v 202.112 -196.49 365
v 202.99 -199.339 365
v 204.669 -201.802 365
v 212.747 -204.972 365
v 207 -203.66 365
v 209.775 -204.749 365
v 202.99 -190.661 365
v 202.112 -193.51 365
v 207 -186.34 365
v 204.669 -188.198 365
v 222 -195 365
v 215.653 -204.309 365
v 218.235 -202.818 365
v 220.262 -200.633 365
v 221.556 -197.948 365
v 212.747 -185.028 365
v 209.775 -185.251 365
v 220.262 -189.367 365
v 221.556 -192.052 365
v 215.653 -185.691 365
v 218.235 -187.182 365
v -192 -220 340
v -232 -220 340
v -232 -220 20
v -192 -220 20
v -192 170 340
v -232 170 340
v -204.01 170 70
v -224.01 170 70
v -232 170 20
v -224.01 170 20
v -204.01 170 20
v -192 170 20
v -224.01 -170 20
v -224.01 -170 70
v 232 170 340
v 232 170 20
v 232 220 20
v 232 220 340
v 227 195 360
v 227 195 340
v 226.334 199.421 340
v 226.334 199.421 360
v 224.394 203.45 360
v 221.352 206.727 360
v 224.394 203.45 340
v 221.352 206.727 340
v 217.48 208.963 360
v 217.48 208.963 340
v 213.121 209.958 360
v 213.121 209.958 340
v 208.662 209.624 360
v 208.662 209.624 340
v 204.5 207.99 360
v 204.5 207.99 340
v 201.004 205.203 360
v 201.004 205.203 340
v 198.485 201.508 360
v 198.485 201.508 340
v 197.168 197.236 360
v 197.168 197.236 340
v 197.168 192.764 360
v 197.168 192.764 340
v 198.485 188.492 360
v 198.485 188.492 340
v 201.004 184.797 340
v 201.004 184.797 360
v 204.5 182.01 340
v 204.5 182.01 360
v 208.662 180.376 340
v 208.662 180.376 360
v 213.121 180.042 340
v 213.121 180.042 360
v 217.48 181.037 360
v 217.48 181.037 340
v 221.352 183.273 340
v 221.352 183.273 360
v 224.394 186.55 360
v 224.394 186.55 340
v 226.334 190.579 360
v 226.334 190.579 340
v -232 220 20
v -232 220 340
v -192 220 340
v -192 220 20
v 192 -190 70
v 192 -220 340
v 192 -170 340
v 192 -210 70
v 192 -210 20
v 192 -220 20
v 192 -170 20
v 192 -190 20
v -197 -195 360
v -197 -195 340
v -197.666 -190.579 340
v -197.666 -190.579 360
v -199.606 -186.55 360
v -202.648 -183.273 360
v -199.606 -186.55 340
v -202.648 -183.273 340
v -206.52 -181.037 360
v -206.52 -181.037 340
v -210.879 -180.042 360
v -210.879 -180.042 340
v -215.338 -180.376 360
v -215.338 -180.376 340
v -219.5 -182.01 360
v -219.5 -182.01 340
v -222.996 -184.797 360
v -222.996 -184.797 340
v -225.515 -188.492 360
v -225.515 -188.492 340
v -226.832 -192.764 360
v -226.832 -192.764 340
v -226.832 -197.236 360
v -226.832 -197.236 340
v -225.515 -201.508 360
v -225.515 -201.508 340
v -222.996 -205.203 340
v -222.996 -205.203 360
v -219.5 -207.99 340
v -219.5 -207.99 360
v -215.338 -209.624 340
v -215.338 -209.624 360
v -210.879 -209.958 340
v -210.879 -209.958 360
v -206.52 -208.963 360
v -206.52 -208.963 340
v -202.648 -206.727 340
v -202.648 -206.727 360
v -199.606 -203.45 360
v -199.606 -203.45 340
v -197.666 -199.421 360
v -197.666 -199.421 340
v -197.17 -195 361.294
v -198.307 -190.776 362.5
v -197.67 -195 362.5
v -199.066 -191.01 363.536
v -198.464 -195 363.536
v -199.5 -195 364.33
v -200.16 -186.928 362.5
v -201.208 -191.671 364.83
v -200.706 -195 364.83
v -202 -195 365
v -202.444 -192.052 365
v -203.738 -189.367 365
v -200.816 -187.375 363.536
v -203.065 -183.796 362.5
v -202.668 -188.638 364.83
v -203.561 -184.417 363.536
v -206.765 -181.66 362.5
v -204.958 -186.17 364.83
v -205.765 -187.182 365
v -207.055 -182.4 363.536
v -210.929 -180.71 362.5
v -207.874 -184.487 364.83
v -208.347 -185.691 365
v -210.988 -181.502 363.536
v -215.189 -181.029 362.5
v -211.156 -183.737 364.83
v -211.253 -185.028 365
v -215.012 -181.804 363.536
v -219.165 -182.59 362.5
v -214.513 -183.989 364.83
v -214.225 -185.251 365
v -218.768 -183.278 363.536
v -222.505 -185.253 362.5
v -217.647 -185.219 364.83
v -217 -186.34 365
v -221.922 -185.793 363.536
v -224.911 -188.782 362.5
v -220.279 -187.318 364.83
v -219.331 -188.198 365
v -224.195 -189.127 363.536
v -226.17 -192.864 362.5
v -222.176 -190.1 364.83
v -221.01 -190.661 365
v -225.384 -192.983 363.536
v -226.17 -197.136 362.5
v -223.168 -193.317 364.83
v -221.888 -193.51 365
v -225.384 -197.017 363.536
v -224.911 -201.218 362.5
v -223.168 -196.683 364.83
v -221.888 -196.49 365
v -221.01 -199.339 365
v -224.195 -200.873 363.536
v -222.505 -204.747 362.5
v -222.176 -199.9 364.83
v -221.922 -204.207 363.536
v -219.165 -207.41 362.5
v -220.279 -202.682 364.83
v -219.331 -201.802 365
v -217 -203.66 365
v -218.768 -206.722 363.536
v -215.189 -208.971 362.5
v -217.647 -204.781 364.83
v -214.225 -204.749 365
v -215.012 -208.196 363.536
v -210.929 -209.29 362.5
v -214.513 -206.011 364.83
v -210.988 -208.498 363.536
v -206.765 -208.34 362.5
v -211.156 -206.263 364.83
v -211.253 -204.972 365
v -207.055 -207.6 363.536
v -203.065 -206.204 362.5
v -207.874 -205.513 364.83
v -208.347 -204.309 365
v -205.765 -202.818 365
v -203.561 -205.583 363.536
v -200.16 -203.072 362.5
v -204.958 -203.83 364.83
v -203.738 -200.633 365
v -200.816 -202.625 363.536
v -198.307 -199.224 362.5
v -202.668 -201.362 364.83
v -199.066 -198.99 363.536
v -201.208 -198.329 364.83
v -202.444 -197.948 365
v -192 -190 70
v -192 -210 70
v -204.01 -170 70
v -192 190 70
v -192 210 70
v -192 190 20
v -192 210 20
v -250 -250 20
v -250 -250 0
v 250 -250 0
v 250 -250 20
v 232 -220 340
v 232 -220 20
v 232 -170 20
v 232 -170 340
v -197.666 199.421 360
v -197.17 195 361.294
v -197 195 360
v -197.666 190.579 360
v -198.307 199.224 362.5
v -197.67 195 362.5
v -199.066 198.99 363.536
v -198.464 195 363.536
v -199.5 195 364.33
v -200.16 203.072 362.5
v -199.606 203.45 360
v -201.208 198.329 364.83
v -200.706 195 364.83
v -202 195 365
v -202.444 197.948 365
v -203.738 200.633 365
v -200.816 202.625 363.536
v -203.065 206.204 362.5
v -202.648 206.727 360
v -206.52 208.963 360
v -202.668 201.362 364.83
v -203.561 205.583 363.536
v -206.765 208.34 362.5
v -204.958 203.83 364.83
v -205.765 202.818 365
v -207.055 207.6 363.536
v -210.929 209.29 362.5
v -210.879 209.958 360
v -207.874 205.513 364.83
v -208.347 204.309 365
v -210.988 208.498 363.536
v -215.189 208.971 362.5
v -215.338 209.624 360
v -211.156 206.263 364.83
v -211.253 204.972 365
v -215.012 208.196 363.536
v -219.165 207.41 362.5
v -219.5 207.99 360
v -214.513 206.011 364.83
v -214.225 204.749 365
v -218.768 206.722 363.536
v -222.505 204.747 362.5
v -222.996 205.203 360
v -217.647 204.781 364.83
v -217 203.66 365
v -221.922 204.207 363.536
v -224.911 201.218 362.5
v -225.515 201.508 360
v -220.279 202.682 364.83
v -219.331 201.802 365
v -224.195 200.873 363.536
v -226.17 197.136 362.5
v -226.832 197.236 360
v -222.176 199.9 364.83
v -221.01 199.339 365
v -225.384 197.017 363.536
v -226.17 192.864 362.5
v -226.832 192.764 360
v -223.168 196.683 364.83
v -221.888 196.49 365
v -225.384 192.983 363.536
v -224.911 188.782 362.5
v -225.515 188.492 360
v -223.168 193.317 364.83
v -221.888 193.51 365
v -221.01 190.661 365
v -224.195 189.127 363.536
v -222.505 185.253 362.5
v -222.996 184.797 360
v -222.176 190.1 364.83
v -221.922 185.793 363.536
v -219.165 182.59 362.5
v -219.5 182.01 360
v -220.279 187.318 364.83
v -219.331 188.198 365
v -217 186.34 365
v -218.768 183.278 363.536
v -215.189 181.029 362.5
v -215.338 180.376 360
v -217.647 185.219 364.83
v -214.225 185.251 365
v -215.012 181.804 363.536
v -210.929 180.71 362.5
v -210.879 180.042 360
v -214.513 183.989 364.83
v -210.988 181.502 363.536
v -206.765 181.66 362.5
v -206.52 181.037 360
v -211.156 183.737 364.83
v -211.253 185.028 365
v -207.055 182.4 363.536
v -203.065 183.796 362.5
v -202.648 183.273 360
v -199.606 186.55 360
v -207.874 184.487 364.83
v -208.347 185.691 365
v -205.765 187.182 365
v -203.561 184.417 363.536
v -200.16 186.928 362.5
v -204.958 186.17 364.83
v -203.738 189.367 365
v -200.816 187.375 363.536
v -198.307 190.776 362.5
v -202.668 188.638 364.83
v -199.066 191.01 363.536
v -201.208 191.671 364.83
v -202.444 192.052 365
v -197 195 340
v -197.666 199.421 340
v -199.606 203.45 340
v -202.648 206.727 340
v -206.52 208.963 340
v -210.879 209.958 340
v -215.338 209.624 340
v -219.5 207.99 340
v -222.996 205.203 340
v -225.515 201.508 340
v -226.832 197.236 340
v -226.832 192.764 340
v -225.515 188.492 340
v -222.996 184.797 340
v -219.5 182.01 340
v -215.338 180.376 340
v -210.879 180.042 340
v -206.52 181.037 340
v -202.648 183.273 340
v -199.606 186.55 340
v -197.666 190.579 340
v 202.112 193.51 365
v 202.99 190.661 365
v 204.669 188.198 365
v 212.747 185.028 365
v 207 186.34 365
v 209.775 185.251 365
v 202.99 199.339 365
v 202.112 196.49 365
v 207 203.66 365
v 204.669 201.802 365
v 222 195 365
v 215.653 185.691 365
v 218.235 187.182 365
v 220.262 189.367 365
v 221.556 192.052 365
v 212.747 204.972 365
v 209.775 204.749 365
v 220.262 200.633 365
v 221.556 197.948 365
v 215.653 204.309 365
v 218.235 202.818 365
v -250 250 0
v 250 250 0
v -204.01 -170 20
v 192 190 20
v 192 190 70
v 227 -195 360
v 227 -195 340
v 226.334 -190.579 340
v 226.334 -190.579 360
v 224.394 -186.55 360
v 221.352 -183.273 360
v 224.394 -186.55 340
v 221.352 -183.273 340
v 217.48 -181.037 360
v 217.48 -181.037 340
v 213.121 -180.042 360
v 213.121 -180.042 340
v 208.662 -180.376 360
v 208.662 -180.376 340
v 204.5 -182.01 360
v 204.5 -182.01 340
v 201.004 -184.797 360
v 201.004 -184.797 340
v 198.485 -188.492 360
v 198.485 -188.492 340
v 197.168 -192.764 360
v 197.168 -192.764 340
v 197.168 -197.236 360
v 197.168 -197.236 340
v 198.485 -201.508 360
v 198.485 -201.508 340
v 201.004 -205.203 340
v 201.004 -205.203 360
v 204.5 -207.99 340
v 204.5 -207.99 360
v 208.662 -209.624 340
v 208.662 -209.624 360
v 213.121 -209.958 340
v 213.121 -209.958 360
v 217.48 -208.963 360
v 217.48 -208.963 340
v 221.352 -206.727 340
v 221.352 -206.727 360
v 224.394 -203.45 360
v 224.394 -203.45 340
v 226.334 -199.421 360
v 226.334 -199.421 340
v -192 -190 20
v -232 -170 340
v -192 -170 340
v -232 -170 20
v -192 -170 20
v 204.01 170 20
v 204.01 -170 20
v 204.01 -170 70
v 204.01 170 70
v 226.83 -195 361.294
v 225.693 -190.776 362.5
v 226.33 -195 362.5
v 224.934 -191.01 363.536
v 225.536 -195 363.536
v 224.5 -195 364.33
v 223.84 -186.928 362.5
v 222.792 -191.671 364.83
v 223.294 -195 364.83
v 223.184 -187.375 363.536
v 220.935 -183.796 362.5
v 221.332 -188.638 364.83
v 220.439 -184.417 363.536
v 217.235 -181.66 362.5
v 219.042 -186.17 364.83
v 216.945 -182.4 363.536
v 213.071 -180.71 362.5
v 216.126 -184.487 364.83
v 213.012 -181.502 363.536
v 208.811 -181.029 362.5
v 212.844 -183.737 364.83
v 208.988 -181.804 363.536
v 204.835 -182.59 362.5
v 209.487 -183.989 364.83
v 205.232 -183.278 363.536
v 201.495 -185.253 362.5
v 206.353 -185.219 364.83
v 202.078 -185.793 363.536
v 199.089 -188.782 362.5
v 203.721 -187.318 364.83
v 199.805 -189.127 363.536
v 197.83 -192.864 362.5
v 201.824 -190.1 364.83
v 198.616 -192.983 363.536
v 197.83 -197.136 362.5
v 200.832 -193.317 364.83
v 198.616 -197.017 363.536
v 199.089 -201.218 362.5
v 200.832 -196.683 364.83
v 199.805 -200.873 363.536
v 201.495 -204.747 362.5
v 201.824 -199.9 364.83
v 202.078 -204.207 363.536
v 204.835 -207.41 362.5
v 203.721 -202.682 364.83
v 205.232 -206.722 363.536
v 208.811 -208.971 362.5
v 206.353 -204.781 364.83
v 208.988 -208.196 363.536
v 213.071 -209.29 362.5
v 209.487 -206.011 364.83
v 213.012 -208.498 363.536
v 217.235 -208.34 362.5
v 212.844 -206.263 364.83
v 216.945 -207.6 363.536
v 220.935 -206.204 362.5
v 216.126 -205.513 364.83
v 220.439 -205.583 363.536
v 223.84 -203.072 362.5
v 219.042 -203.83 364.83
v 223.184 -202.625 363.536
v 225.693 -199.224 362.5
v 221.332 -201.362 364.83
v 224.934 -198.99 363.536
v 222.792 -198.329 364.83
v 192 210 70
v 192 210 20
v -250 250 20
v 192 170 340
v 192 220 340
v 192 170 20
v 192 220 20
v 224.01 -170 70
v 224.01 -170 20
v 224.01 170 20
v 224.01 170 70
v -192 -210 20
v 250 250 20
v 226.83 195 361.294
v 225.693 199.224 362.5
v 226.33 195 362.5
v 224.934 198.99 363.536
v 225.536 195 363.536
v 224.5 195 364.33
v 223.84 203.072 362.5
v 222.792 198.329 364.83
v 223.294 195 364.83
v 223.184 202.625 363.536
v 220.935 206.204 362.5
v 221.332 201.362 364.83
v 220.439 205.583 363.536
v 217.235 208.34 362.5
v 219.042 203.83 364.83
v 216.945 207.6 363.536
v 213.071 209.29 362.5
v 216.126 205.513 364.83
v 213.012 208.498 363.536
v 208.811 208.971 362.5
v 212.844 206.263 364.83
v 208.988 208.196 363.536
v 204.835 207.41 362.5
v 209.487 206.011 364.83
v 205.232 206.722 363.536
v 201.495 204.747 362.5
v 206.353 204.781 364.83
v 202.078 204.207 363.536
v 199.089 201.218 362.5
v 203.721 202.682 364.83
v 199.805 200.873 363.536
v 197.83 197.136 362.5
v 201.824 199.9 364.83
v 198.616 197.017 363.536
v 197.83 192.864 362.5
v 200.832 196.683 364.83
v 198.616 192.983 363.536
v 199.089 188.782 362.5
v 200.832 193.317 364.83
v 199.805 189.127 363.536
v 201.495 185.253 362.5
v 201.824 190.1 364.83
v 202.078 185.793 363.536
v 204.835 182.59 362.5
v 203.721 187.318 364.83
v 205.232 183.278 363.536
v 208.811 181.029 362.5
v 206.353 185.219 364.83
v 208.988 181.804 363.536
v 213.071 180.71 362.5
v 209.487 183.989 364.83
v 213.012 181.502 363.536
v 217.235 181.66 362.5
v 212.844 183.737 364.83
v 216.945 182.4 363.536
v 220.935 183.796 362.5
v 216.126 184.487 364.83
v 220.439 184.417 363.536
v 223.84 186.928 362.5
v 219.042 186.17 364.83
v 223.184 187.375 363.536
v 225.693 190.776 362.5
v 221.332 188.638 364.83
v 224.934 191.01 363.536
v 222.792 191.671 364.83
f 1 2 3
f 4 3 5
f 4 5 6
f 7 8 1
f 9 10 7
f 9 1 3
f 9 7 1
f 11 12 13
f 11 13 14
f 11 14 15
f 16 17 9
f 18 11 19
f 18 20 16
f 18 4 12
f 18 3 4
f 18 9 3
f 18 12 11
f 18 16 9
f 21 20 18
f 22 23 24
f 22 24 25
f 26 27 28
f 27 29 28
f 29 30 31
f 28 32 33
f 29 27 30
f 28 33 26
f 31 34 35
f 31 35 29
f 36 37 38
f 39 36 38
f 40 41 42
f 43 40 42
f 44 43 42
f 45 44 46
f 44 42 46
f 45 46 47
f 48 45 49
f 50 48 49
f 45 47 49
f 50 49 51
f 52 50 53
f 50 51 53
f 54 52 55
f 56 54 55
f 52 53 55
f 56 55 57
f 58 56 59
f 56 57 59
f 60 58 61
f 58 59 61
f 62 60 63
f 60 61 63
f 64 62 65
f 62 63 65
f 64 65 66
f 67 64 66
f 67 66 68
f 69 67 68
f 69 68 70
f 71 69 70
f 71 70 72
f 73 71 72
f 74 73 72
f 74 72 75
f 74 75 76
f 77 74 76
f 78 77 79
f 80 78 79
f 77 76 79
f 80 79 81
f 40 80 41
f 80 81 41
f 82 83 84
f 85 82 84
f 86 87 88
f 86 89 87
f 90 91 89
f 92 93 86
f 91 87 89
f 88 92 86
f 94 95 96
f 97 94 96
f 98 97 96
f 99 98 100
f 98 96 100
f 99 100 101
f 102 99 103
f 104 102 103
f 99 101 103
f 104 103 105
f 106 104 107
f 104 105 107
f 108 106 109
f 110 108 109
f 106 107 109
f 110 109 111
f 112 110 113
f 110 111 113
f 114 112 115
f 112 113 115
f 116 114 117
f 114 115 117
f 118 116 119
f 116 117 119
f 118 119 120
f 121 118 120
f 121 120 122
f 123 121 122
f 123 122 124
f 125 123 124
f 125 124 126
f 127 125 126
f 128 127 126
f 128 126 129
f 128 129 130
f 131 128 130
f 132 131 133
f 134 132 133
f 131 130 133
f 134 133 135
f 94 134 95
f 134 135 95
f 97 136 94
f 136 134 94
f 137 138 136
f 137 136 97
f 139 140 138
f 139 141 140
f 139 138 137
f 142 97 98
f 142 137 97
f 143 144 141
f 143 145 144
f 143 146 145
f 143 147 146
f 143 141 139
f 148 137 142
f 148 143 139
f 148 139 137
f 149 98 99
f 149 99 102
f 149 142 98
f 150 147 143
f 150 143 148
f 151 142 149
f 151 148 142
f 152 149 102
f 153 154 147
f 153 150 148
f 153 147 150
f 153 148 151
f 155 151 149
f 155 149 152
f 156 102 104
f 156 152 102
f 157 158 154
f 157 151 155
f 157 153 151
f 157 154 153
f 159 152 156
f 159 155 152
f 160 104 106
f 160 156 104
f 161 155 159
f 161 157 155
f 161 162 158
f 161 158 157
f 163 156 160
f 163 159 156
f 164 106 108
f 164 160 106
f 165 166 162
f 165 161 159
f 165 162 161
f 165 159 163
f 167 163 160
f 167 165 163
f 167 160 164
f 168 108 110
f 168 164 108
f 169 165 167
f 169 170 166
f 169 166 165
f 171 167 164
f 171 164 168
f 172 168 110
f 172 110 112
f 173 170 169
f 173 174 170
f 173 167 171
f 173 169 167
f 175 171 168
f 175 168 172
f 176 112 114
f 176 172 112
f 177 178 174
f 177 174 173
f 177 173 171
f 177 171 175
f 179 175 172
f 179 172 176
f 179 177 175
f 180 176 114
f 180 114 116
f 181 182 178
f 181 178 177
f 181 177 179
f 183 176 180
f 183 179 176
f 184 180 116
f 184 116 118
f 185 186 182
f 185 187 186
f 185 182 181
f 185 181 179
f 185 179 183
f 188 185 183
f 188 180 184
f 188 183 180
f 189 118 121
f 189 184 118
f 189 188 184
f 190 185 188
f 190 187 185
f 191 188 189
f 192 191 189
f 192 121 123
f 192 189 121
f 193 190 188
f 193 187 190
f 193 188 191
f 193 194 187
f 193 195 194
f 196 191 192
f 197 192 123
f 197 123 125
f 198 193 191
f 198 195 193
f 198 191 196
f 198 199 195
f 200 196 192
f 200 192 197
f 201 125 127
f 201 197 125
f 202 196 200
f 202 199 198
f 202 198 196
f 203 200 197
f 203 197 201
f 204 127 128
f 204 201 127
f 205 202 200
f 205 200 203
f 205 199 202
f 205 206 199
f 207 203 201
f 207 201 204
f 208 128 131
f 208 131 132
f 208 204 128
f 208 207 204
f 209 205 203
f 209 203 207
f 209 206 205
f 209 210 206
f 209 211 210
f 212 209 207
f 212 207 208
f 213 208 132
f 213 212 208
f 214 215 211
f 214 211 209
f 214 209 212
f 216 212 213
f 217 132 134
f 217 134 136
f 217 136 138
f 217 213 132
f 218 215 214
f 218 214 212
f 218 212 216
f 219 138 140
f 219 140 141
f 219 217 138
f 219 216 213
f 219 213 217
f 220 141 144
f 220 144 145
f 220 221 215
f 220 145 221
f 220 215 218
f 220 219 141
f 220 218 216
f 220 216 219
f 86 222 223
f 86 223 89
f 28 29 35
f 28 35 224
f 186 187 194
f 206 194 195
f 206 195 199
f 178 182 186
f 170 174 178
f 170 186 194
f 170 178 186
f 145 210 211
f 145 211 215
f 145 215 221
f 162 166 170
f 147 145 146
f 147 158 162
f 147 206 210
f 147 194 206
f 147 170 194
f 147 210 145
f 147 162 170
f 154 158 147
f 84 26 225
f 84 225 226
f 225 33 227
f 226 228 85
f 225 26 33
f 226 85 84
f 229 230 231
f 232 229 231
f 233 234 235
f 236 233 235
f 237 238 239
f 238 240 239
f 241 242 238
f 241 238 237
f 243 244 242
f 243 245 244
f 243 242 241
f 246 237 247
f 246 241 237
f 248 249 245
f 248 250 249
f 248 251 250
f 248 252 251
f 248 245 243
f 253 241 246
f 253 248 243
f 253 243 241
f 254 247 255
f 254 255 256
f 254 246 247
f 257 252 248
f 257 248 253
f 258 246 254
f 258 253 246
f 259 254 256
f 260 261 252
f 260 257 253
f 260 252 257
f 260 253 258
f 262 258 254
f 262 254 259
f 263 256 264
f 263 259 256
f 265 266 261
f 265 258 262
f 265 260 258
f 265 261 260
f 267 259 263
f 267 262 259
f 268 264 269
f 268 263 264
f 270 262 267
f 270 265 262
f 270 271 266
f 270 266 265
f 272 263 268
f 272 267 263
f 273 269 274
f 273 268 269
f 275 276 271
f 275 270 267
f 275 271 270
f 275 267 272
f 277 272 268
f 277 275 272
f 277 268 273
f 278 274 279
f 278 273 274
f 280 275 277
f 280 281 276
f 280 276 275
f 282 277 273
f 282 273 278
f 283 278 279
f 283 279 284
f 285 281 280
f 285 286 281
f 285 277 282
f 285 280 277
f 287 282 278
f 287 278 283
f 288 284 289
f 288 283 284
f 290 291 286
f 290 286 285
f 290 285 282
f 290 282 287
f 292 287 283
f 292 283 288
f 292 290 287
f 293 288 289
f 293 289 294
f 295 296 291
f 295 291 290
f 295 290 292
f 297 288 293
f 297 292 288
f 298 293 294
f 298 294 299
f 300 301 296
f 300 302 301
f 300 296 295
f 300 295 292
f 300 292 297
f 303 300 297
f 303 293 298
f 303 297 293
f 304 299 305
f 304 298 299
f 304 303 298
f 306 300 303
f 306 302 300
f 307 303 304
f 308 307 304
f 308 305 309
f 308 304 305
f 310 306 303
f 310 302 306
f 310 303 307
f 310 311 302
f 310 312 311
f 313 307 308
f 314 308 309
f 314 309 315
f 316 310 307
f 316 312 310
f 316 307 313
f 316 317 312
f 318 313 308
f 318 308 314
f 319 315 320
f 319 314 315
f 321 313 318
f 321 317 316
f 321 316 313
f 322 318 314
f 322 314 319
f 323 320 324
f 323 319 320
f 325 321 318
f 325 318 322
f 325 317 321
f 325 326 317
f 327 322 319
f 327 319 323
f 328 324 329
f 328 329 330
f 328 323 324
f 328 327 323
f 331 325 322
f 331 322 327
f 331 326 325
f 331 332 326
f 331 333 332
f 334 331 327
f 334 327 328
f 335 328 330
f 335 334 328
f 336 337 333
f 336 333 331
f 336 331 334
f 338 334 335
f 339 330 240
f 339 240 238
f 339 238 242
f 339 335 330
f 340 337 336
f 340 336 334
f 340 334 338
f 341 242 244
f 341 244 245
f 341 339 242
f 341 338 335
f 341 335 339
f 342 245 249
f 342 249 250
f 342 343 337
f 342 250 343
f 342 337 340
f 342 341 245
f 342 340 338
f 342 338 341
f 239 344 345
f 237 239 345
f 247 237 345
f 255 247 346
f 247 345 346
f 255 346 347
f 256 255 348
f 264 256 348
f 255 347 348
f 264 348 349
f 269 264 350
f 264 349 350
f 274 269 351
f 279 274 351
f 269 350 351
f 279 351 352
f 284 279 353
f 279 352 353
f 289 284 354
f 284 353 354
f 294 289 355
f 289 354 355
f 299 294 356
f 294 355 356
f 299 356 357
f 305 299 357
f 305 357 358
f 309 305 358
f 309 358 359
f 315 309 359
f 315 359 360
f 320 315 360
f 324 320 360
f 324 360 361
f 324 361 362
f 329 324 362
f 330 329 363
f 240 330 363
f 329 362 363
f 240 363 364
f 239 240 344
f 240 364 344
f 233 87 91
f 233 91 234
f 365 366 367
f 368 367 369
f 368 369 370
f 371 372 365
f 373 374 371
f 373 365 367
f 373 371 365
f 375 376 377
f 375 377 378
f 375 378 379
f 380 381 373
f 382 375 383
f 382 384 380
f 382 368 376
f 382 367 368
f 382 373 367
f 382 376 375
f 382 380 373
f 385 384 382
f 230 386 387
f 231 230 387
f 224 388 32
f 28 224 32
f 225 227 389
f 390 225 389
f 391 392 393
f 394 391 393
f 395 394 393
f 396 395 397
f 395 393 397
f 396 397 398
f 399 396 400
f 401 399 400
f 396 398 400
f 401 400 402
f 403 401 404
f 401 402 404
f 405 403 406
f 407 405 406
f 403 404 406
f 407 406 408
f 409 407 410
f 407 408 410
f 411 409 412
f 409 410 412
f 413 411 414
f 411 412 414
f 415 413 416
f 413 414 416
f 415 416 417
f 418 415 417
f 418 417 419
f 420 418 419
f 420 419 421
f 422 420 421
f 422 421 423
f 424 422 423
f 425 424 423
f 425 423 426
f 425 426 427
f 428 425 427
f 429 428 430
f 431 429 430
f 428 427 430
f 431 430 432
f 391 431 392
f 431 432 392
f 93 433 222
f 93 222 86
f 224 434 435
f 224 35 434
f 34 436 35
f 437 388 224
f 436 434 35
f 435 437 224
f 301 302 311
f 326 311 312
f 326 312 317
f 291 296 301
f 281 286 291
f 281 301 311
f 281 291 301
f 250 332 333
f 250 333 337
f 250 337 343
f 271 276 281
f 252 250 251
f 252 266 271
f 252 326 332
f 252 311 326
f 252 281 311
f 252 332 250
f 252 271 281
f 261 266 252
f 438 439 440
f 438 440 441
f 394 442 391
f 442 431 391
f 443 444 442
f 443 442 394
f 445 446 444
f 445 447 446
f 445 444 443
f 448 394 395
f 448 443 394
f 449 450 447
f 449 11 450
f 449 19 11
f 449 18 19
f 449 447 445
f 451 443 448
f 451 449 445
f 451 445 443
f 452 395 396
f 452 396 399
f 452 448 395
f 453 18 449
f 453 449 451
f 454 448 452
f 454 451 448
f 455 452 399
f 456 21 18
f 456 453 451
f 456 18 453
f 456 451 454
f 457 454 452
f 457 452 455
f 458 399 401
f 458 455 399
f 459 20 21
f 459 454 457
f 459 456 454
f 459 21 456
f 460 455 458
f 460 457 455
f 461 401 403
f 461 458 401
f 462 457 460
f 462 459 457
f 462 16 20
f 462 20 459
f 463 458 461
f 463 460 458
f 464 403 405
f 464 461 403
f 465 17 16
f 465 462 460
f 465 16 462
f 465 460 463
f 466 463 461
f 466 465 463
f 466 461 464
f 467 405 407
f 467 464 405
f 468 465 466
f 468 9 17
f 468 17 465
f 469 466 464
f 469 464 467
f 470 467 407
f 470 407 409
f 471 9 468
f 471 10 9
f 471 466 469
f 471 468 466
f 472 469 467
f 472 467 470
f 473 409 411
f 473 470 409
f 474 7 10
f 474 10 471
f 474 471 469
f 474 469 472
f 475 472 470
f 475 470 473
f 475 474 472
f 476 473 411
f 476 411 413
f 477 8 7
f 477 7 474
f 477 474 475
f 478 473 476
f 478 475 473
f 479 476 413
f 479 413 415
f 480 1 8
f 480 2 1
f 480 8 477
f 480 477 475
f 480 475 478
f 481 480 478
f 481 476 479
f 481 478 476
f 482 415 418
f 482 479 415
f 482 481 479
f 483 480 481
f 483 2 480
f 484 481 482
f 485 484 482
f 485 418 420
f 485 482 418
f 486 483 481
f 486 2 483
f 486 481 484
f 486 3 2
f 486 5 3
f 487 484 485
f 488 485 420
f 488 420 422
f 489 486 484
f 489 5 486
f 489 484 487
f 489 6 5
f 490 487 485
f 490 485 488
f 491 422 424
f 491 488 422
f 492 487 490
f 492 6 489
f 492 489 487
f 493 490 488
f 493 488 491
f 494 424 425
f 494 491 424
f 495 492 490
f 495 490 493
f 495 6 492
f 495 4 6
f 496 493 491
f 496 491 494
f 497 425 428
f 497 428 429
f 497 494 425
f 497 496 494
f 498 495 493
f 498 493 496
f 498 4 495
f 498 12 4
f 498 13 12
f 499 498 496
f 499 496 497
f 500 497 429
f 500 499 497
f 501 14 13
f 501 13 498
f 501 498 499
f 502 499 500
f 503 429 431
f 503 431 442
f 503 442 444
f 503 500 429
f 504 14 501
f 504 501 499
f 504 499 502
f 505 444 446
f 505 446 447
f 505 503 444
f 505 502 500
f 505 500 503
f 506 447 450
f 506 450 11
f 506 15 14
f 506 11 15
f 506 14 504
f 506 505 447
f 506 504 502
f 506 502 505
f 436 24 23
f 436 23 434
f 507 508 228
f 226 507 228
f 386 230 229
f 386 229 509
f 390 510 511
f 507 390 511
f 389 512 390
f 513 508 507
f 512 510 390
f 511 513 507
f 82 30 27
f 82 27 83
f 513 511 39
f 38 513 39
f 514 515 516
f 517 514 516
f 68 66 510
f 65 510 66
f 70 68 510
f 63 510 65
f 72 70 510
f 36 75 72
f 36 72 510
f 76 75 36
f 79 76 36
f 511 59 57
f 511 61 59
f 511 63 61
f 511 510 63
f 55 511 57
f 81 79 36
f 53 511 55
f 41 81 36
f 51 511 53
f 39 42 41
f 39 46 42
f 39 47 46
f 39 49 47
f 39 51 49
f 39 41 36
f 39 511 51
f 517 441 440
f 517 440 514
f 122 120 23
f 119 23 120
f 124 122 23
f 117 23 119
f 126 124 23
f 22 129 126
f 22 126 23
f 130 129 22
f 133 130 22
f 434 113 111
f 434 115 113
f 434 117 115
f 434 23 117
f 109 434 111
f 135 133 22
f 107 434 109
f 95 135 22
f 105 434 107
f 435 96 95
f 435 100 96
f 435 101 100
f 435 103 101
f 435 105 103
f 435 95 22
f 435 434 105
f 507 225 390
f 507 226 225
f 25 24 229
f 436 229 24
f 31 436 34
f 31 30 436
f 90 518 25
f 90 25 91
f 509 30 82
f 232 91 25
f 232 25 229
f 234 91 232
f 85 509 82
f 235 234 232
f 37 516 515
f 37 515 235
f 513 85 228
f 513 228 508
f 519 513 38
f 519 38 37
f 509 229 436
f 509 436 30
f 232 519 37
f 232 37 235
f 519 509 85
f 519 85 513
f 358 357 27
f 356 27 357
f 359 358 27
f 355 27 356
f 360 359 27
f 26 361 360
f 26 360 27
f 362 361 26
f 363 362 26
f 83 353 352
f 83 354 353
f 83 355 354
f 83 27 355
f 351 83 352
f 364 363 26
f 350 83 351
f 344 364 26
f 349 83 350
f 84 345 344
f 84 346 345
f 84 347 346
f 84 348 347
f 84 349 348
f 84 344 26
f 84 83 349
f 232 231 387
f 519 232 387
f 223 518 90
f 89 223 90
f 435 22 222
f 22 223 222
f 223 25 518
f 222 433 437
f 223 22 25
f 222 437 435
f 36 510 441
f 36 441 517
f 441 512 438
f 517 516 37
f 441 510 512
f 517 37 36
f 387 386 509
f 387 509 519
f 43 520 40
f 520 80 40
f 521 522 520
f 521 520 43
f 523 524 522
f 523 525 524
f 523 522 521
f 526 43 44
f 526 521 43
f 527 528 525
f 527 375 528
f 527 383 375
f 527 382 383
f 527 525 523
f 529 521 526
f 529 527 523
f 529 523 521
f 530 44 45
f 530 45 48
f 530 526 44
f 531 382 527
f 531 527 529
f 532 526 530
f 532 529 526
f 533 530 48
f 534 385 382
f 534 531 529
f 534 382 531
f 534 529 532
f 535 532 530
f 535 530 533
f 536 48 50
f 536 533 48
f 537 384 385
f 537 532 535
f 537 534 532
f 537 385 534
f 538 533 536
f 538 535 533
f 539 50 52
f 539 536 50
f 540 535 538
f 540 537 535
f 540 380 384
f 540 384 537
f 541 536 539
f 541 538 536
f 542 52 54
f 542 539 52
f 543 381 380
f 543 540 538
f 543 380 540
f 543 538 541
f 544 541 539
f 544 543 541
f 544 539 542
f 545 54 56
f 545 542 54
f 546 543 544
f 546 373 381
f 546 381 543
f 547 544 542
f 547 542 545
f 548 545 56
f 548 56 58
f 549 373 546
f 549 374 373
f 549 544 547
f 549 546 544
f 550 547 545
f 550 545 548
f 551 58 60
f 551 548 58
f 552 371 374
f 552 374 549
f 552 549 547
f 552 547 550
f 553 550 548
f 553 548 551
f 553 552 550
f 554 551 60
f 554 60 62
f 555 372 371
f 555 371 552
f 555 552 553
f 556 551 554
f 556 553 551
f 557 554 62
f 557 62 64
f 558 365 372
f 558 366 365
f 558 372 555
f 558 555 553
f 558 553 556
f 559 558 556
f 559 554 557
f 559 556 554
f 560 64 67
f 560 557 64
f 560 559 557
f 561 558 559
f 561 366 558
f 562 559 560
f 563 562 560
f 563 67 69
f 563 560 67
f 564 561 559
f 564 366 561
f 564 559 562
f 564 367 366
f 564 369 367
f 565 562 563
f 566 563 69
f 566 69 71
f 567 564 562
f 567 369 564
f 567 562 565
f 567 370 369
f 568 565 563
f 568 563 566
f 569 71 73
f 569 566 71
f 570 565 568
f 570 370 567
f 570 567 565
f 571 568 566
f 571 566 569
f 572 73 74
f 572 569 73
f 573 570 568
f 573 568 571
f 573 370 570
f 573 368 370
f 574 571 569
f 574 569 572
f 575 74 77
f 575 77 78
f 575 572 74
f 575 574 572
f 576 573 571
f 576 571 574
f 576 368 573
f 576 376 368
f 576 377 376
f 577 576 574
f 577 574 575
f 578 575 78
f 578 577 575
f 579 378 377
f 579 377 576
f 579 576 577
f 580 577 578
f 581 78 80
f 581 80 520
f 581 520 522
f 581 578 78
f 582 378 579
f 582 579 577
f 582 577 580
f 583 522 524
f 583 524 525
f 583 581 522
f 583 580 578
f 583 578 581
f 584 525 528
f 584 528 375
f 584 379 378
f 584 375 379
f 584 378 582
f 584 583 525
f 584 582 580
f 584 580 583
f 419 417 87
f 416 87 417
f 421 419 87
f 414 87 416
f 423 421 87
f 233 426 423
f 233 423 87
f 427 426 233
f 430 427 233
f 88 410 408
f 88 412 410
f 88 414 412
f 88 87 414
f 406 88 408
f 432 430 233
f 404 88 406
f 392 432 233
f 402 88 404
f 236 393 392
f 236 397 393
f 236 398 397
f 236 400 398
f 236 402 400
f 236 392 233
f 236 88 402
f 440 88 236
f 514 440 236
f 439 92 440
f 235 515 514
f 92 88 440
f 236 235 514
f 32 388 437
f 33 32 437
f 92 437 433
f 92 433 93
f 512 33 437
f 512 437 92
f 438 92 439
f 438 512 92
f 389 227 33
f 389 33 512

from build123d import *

# Parameters (mm, degrees)
F0_W     = 500
F0_H     = 500
F1_DEPTH = 20
F2_W     = 40
F2_H     = 50
F3_DEPTH = 320
F4_W     = 384
F4_H     = 20
F4_W_2   = 20
F4_H_2   = 340
F5_DEPTH = 50
F7_R     = 15
F8_DEPTH = 25
F9_R     = 5


with BuildPart() as f1:
    # F0 (on Top) → F1 (new body)
    with BuildSketch(Plane.XY):
        Rectangle(F0_W, F0_H)
    extrude(amount=F1_DEPTH)

    # F2 (on face) → F3 (join)
    with BuildSketch(Plane.XY.offset(20)):
        with Locations((212, 195)):
            Rectangle(F2_W, F2_H)
        with Locations((-212, -195)):
            Rectangle(F2_W, F2_H)
        with Locations((212, -195)):
            Rectangle(F2_W, F2_H)
        with Locations((-212, 195)):
            Rectangle(F2_W, F2_H)
    extrude(amount=F3_DEPTH)

    # F4 (on face) → F5 (join)
    with BuildSketch(Plane.XY.offset(20)):
        with Locations((0, -200)):
            Rectangle(F4_W, F4_H)
        Polygon((-192, 199.430282), (-192, 190), (192, 190), (192, 195), (192, 210), (-192, 210), align=None)
        with Locations((214.009886, 0)):
            Rectangle(F4_W_2, F4_H_2)
        with Locations((-214.009886, 0)):
            Rectangle(F4_W_2, F4_H_2)
    extrude(amount=F5_DEPTH)

    # F7 (on face) → F8 (join)
    with BuildSketch(Plane.XY.offset(340)):
        with Locations((212, 195)):
            Circle(F7_R)
        with Locations((-212, 195)):
            Circle(F7_R)
        with Locations((212, -195)):
            Circle(F7_R)
        with Locations((-212, -195)):
            Circle(F7_R)
    extrude(amount=F8_DEPTH)

    # F9
    f9_edges = [f1.edges().sort_by_distance(p)[0] for p in [
        (197, 195, 365),
        (197, -195, 365),
        (-227, -195, 365),
        (-227, 195, 365),
    ]]
    fillet(f9_edges, radius=F9_R)


solid = f1.part
